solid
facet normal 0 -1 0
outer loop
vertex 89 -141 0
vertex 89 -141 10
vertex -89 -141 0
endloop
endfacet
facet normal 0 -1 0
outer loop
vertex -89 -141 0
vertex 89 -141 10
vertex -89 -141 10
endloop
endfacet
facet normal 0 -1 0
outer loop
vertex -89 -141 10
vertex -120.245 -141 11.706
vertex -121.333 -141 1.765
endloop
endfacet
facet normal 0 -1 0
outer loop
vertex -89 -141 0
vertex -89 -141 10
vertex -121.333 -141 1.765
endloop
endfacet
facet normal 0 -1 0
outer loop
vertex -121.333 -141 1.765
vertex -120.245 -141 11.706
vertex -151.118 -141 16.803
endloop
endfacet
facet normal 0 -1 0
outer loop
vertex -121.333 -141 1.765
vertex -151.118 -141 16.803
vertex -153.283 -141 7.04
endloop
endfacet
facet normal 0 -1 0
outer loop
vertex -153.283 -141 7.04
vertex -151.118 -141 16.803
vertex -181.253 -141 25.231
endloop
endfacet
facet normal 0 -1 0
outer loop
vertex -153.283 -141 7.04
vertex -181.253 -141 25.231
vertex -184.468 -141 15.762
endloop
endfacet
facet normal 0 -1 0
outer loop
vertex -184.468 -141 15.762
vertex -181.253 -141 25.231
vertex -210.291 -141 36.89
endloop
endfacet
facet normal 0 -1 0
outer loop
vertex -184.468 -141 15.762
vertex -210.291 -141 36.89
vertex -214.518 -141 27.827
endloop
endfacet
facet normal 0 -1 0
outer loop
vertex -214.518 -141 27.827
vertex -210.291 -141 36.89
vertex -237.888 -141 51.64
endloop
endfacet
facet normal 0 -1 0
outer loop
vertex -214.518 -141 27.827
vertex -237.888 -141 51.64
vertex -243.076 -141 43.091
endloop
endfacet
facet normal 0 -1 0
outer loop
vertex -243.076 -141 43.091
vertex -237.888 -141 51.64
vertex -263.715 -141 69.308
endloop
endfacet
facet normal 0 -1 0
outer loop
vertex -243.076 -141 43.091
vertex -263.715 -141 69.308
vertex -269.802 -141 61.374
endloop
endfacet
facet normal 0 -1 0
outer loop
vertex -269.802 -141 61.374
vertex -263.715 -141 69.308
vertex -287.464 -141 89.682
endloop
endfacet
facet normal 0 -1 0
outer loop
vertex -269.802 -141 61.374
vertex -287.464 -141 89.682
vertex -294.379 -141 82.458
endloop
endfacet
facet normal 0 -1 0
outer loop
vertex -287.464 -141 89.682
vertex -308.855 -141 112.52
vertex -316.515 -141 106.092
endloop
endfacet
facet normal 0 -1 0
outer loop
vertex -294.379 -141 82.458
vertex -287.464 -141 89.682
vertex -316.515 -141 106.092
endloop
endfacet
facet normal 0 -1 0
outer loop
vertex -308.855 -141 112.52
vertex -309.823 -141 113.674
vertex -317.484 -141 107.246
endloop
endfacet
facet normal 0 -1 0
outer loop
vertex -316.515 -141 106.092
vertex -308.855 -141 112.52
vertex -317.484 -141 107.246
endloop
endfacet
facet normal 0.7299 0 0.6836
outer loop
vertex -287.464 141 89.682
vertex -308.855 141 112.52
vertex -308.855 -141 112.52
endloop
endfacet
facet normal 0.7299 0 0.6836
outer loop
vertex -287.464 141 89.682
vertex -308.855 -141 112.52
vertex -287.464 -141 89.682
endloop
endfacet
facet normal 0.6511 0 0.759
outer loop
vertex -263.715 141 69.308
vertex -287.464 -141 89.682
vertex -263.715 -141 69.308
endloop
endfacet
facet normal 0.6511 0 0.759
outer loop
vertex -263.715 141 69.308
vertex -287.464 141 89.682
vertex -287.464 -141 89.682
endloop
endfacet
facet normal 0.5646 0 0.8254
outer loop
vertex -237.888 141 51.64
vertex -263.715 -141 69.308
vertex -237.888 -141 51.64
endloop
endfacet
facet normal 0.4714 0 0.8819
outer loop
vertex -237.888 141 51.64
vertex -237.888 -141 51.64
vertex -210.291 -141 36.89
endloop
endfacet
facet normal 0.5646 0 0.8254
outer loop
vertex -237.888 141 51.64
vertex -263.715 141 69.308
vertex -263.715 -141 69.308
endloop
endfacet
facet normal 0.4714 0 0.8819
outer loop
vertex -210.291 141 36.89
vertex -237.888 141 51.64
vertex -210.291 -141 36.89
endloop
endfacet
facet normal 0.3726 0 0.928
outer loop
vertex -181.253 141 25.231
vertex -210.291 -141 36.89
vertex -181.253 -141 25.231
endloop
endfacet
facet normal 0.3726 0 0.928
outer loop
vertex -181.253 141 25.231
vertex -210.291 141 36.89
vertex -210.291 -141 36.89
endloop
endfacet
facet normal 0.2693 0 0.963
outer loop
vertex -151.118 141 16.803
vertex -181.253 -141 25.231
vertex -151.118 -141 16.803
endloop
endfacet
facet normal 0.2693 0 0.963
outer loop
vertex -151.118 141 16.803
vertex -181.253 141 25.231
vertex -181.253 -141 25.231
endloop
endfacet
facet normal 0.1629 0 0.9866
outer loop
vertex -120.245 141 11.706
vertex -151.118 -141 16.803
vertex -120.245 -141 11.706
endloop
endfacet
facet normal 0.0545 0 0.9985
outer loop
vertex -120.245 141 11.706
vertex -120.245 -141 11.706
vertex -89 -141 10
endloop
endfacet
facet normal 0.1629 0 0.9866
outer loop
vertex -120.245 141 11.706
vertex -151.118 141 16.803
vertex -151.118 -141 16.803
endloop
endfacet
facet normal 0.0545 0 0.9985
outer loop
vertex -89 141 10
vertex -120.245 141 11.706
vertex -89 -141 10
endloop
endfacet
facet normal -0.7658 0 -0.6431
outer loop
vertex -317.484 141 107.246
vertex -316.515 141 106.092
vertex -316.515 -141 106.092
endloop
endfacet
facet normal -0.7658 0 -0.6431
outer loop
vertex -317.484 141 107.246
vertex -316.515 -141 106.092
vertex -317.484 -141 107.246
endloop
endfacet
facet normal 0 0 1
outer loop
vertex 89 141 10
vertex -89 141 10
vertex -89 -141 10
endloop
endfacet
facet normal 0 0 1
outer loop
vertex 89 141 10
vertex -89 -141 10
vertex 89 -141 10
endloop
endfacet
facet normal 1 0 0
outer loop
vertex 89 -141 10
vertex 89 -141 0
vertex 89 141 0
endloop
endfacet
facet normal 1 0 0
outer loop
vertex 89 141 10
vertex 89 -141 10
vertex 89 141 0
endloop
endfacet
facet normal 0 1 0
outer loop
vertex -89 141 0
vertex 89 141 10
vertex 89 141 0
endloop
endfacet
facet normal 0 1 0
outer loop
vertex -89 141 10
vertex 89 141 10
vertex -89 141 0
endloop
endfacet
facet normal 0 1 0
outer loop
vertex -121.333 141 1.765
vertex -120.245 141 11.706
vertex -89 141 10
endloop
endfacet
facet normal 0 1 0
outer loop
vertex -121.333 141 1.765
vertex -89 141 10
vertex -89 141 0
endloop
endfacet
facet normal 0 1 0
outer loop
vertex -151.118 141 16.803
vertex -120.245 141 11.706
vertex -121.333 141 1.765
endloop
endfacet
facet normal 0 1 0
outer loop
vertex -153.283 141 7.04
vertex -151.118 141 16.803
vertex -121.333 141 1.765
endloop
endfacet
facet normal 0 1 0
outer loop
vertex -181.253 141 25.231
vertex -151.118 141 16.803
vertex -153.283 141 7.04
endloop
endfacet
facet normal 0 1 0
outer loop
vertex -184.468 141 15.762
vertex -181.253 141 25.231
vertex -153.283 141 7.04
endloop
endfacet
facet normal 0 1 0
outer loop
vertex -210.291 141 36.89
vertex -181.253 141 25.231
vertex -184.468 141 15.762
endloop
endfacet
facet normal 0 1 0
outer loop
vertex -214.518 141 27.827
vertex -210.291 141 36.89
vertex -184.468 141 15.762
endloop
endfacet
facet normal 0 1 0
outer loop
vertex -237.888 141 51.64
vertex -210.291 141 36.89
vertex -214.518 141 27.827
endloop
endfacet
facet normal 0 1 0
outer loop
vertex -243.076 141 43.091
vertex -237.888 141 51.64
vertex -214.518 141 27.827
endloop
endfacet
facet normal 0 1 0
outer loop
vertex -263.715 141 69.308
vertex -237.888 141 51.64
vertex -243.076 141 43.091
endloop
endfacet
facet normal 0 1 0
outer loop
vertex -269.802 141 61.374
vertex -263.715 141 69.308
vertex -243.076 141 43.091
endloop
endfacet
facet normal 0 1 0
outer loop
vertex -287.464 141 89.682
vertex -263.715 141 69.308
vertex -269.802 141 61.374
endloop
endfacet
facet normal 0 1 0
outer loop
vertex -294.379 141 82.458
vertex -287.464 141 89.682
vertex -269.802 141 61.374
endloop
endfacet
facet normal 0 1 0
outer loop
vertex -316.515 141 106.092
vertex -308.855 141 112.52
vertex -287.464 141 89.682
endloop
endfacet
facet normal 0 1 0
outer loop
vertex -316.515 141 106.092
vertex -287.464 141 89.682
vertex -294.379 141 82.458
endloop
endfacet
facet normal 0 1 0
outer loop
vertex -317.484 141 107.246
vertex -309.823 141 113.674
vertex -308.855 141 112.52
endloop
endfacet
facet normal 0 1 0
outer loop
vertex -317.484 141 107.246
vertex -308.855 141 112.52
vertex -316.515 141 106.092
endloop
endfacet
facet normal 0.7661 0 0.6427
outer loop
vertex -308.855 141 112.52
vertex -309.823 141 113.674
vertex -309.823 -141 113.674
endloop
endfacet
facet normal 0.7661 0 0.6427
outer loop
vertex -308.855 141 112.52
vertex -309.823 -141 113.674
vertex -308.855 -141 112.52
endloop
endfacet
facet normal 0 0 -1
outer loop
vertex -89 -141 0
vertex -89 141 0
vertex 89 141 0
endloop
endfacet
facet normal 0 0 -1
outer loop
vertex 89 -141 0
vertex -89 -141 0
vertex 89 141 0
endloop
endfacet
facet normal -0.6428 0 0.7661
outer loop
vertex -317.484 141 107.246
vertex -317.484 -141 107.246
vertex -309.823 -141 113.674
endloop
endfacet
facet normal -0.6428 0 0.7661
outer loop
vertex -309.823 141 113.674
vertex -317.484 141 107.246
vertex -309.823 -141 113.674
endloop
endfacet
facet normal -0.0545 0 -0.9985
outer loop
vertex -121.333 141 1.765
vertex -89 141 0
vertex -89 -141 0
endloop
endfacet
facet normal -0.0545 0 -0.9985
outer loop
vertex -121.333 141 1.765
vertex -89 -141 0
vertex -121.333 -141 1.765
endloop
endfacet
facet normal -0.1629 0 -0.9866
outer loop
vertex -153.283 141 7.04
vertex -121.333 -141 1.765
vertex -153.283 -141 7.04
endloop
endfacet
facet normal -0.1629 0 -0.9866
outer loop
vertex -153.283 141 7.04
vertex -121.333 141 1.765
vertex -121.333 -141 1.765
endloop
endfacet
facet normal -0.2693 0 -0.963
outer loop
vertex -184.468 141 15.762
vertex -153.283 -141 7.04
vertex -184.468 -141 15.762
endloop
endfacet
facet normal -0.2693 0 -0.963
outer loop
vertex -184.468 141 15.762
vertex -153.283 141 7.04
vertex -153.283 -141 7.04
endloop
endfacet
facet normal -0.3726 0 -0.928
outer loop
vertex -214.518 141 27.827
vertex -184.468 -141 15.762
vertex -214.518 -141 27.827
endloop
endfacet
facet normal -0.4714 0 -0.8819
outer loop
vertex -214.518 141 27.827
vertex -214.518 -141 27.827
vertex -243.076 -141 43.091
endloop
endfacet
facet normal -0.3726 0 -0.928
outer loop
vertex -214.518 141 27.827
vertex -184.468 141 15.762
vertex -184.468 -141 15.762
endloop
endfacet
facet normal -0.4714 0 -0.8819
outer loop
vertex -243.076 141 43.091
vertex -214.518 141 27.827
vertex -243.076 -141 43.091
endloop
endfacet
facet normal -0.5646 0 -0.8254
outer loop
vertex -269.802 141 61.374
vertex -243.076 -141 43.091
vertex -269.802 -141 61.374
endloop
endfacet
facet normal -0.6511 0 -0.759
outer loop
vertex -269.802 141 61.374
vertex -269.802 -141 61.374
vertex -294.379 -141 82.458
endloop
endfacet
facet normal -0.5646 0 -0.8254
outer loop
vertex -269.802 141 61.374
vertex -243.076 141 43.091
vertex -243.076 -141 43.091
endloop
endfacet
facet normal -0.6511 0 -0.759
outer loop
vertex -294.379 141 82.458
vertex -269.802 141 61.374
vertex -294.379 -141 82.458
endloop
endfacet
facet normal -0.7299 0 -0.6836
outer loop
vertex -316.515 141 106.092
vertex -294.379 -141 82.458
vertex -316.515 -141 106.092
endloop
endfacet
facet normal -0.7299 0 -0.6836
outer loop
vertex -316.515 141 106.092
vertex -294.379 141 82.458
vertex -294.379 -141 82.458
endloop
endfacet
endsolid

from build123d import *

# Parameters (mm, degrees)
SKETCH2_W          = 178
SKETCH2_H          = 282
BASE_FLANGE1_DEPTH = 10
EDGE_FLANGE2_DEPTH = 282


# Sheet-metal steps are written as plain solids
with BuildPart() as part:
    # Sketch2 → Base-Flange1 (new body)
    with BuildSketch(Plane.XY):
        Rectangle(SKETCH2_W, SKETCH2_H)
    extrude(amount=BASE_FLANGE1_DEPTH)

    # Edge-Flange2 section (across the edge) → Edge-Flange2 (add)
    with BuildSketch(Plane(origin=(-222.83029789, 141, 10), x_dir=(0.7660444431189746, 0, 0.6427876096865435), z_dir=(0, -1, 0))):
        with BuildLine():
            Line((-10, 133.83029789), (-10, 135.336923418))
            Line((-10, 135.336923418), (0, 135.336923418))
            Line((0, 135.336923418), (0, 133.83029789))
            ThreePointArc((0, 133.83029789), (26.88966512, 12.538856771), (102.51995602, -86.024457285))
            Line((102.51995602, -86.024457285), (96.092079923, -93.684901716))
            ThreePointArc((96.092079923, -93.684901716), (17.82658725, 8.312674153), (-10, 133.83029789))
        make_face()
    extrude(amount=EDGE_FLANGE2_DEPTH)


solid = part.part
